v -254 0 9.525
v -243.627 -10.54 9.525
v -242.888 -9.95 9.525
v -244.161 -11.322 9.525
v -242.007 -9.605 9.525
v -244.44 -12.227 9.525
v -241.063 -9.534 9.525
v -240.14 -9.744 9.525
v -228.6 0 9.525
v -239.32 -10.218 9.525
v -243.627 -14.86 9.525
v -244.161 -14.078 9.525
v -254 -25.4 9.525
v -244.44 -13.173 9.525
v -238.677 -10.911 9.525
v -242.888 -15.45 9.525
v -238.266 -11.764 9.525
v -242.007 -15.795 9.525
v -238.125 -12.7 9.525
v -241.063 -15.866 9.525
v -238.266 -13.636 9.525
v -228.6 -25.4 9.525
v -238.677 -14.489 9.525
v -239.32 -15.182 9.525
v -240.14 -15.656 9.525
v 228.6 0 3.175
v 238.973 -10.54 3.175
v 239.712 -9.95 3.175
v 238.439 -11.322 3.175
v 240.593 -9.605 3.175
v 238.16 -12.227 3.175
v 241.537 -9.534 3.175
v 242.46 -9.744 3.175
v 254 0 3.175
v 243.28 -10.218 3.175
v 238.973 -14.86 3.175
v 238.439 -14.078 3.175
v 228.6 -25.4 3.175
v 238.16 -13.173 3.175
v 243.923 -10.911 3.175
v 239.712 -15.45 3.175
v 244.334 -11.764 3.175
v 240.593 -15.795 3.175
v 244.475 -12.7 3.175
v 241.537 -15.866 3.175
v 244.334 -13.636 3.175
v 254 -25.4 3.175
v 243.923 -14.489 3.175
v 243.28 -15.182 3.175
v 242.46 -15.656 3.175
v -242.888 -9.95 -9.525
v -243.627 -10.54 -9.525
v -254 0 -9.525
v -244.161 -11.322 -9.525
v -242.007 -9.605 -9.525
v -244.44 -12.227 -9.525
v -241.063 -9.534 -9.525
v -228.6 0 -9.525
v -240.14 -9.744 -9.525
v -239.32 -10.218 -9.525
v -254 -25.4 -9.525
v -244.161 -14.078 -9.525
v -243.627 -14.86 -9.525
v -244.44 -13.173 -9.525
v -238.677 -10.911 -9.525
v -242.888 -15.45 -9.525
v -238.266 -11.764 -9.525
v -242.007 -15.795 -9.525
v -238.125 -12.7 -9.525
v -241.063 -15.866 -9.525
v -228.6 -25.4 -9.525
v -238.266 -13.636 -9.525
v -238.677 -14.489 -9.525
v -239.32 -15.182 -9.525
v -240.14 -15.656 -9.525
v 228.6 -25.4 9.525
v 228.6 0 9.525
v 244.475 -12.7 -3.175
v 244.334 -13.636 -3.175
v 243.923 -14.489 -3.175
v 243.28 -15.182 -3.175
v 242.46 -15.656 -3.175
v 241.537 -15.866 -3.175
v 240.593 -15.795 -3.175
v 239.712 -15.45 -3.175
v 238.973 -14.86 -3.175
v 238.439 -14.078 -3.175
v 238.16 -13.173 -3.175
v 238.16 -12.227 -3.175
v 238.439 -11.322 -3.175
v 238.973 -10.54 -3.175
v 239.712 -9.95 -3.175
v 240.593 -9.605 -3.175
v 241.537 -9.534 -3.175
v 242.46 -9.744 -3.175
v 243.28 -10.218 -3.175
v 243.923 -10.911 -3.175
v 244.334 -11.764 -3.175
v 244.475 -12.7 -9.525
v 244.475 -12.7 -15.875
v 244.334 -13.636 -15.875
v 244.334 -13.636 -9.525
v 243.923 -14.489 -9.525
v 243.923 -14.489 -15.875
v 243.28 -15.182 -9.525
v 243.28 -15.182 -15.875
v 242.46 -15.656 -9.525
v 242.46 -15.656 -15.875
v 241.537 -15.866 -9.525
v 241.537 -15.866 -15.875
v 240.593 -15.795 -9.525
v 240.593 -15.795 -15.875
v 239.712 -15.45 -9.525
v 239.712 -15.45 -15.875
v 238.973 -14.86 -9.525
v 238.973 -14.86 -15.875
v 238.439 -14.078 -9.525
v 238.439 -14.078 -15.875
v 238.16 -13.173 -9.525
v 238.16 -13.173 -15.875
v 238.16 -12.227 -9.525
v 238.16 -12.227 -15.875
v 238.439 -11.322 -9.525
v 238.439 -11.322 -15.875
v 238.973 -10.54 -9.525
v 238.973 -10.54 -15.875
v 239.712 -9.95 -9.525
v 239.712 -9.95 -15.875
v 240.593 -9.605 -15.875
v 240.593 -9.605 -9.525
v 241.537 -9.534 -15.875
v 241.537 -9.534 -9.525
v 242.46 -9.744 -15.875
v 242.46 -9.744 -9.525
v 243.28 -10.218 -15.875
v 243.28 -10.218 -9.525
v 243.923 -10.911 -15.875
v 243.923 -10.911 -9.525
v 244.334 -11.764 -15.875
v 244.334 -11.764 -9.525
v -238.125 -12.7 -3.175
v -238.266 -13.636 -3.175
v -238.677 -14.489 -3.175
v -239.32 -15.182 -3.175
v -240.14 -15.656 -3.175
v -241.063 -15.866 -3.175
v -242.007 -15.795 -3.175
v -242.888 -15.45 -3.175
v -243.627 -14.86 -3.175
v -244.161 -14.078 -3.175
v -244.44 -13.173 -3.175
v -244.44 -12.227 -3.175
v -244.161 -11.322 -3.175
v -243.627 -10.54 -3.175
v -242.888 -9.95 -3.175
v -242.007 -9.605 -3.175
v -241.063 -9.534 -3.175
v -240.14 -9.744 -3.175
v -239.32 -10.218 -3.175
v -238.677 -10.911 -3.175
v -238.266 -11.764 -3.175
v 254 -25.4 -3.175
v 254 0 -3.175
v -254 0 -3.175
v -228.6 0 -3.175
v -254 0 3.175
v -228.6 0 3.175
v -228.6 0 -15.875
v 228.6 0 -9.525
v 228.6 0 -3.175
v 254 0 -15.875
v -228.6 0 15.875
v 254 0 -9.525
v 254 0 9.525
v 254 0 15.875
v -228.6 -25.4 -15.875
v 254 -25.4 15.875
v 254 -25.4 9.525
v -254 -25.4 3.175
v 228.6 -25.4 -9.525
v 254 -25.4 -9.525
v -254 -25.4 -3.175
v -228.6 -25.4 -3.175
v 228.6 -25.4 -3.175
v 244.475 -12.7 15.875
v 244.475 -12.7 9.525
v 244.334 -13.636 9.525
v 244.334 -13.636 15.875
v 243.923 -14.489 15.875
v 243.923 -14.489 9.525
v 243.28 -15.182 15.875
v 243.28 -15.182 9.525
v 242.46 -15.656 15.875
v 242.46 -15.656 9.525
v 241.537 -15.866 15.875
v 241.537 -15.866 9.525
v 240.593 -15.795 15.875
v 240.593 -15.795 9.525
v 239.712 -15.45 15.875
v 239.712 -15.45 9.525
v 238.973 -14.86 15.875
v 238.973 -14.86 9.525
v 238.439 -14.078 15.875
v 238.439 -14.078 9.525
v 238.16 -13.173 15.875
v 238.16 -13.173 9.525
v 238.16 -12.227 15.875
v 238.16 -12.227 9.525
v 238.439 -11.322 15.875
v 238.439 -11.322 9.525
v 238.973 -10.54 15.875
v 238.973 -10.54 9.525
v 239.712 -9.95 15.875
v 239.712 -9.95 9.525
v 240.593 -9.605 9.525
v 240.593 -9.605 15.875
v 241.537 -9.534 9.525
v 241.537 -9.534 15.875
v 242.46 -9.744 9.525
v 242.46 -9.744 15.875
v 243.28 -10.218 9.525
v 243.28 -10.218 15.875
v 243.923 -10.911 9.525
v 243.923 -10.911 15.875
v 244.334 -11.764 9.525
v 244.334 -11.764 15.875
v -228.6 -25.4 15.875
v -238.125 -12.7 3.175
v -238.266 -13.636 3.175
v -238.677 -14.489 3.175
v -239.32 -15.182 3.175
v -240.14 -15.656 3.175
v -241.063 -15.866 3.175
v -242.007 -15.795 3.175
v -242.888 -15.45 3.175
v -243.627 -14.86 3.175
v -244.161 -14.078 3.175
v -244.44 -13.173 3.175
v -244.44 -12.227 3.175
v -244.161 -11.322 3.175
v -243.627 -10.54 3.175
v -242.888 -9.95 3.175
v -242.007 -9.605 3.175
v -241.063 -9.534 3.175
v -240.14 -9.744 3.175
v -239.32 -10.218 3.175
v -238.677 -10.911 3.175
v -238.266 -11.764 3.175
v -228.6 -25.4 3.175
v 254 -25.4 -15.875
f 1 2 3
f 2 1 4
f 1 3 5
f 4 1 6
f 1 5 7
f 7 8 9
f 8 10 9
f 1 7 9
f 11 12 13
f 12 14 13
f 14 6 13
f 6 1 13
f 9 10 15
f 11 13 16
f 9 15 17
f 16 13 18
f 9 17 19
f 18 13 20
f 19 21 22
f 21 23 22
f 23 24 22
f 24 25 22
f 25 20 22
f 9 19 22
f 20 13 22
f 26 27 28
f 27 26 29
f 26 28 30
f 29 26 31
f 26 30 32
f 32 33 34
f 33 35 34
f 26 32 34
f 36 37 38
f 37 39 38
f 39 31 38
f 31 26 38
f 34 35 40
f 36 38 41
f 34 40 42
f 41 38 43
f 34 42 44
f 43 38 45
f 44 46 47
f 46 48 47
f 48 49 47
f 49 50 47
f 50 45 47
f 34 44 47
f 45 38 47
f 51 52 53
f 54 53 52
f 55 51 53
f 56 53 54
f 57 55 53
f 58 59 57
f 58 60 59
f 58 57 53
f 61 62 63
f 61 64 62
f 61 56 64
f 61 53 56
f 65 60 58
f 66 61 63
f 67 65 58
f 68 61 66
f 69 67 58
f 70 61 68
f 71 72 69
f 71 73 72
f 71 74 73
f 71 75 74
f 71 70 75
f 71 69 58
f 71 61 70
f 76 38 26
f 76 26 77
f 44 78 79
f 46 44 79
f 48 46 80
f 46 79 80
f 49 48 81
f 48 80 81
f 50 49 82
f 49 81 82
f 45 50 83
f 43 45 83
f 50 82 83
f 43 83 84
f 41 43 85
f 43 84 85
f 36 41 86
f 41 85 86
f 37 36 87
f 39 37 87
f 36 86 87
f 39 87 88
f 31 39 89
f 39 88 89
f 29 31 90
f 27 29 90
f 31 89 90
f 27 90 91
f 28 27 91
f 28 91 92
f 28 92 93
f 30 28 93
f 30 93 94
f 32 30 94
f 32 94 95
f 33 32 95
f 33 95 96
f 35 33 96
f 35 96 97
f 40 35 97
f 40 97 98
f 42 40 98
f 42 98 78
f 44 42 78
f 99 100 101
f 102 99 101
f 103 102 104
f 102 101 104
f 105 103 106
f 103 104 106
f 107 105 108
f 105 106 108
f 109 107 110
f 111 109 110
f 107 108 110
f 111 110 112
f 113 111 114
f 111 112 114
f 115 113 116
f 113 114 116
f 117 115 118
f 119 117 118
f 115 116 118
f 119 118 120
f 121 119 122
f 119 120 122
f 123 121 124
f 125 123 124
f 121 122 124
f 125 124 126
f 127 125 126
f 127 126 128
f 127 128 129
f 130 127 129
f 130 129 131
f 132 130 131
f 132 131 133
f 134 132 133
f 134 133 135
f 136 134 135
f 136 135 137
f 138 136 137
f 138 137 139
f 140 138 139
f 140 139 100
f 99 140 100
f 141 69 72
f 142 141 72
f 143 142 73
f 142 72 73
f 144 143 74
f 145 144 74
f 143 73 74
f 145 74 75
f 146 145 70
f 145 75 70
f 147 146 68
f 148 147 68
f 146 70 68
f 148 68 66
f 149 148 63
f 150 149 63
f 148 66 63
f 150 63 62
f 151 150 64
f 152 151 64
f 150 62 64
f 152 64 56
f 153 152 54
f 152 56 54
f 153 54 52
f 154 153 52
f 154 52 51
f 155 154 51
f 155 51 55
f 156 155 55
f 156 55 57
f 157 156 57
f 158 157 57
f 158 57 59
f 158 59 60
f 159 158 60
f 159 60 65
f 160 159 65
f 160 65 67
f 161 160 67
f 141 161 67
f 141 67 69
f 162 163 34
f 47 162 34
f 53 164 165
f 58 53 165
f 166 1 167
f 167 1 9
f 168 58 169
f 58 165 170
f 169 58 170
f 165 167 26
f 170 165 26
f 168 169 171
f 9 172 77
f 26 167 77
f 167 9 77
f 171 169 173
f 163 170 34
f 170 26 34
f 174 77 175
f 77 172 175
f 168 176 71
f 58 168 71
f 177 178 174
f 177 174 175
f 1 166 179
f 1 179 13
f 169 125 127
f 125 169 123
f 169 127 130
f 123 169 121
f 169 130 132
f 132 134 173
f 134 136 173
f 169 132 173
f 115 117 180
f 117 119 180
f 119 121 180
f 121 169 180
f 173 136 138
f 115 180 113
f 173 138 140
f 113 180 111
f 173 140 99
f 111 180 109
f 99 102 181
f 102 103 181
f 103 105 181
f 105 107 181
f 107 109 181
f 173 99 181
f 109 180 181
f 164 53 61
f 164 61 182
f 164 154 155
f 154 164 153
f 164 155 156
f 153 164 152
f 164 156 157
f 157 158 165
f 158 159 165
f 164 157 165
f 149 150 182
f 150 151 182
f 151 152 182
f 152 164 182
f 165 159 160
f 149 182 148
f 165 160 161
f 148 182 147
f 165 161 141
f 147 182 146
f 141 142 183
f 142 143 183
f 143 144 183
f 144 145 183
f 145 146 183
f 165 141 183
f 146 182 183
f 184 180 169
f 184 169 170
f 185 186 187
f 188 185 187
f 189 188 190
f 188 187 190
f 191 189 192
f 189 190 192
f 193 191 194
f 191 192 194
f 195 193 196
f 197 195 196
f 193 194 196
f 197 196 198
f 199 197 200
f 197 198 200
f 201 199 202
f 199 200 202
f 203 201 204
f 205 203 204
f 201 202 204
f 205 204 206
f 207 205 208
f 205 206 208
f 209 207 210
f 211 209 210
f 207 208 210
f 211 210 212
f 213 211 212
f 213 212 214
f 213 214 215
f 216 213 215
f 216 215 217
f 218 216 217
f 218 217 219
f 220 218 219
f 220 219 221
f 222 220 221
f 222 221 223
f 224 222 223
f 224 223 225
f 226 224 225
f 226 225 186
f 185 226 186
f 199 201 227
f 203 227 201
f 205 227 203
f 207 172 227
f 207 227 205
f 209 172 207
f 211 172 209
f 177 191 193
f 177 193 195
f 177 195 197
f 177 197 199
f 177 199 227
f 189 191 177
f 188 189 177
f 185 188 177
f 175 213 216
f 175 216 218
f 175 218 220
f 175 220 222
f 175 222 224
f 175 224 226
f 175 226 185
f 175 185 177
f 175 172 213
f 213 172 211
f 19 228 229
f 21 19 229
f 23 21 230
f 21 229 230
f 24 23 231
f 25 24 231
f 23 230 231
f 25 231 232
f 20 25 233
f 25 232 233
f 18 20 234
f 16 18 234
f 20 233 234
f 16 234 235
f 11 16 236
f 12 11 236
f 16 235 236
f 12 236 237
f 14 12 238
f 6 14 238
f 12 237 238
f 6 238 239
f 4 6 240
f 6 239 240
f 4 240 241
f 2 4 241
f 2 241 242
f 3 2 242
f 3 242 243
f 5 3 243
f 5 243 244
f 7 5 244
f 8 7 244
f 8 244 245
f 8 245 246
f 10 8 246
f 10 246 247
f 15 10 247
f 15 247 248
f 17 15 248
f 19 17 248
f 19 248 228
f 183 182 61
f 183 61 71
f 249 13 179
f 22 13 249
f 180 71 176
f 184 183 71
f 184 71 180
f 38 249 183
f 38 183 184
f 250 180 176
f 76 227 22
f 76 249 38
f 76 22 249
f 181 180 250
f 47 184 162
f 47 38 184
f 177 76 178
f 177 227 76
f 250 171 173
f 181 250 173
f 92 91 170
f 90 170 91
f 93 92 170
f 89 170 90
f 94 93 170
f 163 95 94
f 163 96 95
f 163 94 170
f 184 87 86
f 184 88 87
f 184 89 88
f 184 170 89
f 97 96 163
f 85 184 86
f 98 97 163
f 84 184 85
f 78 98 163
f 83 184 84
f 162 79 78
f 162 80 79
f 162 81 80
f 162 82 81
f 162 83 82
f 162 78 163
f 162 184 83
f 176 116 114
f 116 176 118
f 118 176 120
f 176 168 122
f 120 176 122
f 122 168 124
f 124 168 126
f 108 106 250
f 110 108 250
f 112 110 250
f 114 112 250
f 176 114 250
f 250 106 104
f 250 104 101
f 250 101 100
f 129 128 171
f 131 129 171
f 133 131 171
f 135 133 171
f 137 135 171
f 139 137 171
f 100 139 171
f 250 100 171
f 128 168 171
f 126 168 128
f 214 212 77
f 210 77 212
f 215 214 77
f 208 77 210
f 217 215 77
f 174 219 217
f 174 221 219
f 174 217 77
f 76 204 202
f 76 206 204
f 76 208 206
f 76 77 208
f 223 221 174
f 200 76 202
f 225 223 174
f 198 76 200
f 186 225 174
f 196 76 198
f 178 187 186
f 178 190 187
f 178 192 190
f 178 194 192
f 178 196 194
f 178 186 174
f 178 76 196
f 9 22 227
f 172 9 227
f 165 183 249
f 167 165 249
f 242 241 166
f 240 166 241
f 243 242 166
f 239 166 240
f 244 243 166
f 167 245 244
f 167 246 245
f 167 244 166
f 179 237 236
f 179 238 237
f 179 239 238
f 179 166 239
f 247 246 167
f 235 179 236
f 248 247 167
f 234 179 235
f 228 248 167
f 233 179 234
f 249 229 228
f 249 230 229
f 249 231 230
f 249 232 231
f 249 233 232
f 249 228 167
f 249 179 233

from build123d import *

# Parameters (mm, degrees)
SKETCH_W        = 508
SKETCH_H        = 31.75
PAD_DEPTH       = 25.4
SKETCH001_W     = 25.4
SKETCH001_H     = 6.35
POCKET_DEPTH    = 25.401
SKETCH002_W     = 25.4
SKETCH002_H     = 6.35
POCKET001_DEPTH = 25.401
SKETCH003_R     = 3.175
POCKET002_DEPTH = 31.751


with BuildPart() as part:
    # Sketch → Pad (new body)
    with BuildSketch(Plane.XZ):
        Rectangle(SKETCH_W, SKETCH_H)
    extrude(amount=PAD_DEPTH)

    # Sketch001 (on Face6 of Pad) → Pocket (cut, through all)
    with BuildSketch(Plane.XZ.offset(25.4)):
        with Locations((-241.3, 12.7)):
            Rectangle(SKETCH001_W, SKETCH001_H)
        with Locations((-241.3, 0)):
            Rectangle(SKETCH001_W, SKETCH001_H)
        with Locations((-241.3, -12.7)):
            Rectangle(SKETCH001_W, SKETCH001_H)
    extrude(amount=-POCKET_DEPTH, mode=Mode.SUBTRACT)

    # Sketch002 (on Face6 of Pad) → Pocket001 (cut, through all)
    with BuildSketch(Plane.XZ.offset(25.4)):
        with Locations((241.3, 6.35)):
            Rectangle(SKETCH002_W, SKETCH002_H)
        with Locations((241.3, -6.35)):
            Rectangle(SKETCH002_W, SKETCH002_H)
    extrude(amount=-POCKET001_DEPTH, mode=Mode.SUBTRACT)

    # Sketch003 (on Face11 of Pocket001) → Pocket002 (cut, through all)
    with BuildSketch(Plane(origin=(0, 0, -15.875), x_dir=(1, 0, 0), z_dir=(0, 0, -1))):
        with Locations((-241.3, 12.7)):
            Circle(SKETCH003_R)
        with Locations((241.3, 12.7)):
            Circle(SKETCH003_R)
    extrude(amount=-POCKET002_DEPTH, mode=Mode.SUBTRACT)


solid = part.part
